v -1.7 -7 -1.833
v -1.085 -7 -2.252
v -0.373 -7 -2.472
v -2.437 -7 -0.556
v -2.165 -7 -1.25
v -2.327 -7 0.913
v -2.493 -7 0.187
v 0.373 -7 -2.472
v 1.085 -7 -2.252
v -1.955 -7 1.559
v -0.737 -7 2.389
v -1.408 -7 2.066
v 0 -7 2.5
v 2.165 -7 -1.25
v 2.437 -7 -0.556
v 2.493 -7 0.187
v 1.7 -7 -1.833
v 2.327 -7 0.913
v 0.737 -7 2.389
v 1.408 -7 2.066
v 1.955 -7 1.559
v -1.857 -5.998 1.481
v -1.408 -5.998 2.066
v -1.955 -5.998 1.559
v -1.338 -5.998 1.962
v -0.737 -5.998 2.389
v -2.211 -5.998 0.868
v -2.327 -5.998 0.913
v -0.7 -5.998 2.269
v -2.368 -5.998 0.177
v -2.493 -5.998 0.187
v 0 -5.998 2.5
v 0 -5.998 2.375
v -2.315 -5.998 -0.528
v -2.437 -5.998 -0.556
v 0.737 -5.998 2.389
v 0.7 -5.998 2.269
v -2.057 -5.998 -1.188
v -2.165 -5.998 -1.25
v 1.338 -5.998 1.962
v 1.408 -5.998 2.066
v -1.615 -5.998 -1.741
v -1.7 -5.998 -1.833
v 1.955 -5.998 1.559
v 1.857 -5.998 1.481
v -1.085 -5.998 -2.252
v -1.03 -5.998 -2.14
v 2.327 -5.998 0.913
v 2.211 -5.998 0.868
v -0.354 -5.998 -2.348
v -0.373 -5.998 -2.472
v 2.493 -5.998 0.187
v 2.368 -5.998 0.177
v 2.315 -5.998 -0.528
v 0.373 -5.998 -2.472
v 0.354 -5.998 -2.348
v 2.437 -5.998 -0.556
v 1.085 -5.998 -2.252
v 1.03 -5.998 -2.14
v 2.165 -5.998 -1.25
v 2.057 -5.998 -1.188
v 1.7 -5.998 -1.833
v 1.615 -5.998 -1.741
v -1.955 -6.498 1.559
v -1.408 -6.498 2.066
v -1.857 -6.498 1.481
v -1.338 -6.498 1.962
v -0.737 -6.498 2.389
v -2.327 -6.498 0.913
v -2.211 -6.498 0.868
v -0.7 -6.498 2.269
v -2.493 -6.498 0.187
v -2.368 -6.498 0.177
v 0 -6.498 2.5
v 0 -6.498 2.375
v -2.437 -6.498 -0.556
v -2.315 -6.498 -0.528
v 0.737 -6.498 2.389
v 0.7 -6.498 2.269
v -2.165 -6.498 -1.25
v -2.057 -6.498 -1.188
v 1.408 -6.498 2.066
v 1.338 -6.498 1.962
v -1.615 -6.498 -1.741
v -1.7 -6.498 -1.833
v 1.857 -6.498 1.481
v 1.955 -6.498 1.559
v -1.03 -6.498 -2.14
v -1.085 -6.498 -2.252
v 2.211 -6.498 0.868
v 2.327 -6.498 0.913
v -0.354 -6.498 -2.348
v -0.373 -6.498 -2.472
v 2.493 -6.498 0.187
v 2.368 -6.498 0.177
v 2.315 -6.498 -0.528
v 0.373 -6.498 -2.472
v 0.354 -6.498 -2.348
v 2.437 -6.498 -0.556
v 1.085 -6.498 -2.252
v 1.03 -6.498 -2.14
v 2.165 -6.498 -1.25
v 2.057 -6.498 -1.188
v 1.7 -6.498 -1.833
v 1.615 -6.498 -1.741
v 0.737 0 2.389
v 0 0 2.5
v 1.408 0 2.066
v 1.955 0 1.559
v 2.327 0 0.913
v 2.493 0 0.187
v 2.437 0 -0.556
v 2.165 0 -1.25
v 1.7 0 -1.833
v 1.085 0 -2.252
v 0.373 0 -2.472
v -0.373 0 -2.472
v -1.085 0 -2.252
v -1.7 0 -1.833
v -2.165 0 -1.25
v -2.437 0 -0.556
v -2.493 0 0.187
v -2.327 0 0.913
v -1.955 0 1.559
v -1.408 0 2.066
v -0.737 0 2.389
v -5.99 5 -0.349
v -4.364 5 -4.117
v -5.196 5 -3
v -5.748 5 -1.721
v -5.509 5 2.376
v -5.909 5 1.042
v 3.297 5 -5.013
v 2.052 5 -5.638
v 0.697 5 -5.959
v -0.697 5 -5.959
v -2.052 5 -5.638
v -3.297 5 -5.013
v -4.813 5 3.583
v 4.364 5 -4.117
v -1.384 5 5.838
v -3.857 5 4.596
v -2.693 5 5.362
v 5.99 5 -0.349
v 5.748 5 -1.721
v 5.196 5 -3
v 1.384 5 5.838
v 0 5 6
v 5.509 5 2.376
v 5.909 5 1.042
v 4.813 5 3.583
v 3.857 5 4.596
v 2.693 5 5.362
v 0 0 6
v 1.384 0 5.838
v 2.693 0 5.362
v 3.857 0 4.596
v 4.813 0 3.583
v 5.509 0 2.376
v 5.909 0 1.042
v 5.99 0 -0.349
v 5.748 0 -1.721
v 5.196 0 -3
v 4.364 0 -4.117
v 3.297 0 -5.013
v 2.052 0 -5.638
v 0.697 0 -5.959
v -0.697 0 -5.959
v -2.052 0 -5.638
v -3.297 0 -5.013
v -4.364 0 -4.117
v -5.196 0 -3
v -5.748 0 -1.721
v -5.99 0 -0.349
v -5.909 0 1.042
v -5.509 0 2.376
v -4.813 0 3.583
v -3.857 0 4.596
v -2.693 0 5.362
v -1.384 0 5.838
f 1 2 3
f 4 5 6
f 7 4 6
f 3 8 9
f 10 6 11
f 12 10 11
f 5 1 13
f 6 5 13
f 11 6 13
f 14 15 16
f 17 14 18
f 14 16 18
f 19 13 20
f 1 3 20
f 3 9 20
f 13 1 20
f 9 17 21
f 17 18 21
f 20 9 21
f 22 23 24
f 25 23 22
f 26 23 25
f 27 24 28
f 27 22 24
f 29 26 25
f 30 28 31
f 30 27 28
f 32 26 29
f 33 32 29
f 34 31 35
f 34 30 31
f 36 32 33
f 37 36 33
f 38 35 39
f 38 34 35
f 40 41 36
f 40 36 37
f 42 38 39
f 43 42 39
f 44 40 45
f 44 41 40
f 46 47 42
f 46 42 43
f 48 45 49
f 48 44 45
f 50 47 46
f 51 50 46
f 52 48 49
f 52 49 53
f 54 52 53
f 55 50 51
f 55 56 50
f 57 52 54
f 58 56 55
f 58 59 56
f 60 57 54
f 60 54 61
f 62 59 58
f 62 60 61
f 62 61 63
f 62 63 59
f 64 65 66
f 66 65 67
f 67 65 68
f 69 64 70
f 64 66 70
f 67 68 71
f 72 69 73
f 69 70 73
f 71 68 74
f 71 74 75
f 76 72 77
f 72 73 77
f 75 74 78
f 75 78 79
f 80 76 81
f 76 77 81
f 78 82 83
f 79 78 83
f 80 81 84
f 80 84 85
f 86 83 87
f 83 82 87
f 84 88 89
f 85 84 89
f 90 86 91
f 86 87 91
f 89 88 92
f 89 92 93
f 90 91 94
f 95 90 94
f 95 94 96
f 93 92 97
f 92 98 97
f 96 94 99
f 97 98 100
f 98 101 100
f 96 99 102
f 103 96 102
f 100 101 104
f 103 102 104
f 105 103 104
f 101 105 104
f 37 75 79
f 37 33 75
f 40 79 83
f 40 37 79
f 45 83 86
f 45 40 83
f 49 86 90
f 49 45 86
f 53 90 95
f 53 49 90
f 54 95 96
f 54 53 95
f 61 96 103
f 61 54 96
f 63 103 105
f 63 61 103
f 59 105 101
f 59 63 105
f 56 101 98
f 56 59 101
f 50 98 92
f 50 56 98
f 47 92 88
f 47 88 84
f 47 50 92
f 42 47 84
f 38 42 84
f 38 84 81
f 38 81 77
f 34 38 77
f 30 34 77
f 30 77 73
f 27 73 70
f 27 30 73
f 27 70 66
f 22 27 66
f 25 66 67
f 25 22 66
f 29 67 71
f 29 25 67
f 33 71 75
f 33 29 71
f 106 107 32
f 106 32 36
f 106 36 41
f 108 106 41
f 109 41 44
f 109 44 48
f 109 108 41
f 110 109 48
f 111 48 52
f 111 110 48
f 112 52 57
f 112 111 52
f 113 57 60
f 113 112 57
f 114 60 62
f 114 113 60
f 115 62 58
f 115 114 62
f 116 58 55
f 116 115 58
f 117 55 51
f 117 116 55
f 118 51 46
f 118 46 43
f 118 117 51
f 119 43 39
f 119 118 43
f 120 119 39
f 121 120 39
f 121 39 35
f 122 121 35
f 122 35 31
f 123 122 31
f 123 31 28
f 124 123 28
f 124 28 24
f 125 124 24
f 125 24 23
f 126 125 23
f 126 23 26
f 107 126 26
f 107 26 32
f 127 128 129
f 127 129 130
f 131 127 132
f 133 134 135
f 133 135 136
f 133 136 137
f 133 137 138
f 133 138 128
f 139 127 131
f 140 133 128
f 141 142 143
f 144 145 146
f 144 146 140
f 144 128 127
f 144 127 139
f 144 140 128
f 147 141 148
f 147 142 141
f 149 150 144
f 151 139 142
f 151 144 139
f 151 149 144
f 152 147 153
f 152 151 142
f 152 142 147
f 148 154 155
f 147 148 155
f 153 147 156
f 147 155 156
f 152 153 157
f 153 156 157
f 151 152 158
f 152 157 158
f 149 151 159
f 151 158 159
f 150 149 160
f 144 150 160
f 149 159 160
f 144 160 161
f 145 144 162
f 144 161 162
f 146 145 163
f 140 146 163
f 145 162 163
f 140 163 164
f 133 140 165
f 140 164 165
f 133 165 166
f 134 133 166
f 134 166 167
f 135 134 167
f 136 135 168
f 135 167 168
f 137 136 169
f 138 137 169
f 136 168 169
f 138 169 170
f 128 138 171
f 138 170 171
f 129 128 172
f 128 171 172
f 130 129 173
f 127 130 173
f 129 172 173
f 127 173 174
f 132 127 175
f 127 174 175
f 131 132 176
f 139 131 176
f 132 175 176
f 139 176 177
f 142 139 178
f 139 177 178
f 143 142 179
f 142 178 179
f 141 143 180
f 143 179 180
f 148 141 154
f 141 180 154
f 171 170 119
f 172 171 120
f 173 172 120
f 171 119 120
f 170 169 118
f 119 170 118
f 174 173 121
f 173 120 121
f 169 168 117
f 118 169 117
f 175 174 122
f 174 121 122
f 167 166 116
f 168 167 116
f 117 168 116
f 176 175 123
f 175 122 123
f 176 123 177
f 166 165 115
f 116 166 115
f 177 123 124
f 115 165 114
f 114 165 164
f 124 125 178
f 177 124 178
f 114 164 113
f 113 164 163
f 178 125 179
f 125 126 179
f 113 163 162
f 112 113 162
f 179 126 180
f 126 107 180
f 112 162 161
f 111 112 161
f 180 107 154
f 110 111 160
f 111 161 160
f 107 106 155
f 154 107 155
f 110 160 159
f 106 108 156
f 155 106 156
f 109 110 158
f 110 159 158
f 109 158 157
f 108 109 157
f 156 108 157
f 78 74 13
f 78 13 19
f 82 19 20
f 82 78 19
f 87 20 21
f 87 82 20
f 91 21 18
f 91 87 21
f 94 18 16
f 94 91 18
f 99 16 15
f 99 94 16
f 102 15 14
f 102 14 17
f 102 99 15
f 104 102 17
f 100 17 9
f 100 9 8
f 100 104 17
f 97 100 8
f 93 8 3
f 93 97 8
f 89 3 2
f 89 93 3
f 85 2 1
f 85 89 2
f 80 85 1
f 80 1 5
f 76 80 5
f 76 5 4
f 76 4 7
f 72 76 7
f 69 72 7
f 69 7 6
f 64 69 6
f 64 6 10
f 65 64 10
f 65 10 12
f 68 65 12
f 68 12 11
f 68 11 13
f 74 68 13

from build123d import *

# Parameters (mm, degrees)
SKETCH1_R           = 6
BOSS_EXTRUDE1_DEPTH = 5
SKETCH2_R           = 2.5
BOSS_EXTRUDE2_DEPTH = 12
SKETCH4_W           = 0.625
SKETCH4_H           = 0.5


with BuildPart() as part:
    # Sketch1 → Boss-Extrude1 (new body)
    with BuildSketch(Plane(origin=(0, 0, 0), x_dir=(1, 0, 0), z_dir=(0, 1, 0))):
        with Locations(Location((0, 0, 0), (0, 0, 270))):
            Circle(SKETCH1_R)
    extrude(amount=BOSS_EXTRUDE1_DEPTH)

    # Sketch2 → Boss-Extrude2 (add)
    with BuildSketch(Plane(origin=(0, 5, 0), x_dir=(-1, 0, 0), z_dir=(0, 1, 0))):
        with Locations(Location((0, 0, 0), (0, 0, 90))):
            Circle(SKETCH2_R)
    extrude(amount=-BOSS_EXTRUDE2_DEPTH)

    # Sketch4 → Groove for ANSI B27.7 - 3AM1-5, Basic External Retaining Ring1 (revolve, cut)
    with BuildSketch(Plane(origin=(0, -7, 0), x_dir=(0, 0, 1), z_dir=(-1, 0, 0))):
        with Locations((2.6875, 0.751696416)):
            Rectangle(SKETCH4_W, SKETCH4_H)
    revolve(axis=Axis((0, -57, 0), (0, 1, 0)), mode=Mode.SUBTRACT)


solid = part.part
